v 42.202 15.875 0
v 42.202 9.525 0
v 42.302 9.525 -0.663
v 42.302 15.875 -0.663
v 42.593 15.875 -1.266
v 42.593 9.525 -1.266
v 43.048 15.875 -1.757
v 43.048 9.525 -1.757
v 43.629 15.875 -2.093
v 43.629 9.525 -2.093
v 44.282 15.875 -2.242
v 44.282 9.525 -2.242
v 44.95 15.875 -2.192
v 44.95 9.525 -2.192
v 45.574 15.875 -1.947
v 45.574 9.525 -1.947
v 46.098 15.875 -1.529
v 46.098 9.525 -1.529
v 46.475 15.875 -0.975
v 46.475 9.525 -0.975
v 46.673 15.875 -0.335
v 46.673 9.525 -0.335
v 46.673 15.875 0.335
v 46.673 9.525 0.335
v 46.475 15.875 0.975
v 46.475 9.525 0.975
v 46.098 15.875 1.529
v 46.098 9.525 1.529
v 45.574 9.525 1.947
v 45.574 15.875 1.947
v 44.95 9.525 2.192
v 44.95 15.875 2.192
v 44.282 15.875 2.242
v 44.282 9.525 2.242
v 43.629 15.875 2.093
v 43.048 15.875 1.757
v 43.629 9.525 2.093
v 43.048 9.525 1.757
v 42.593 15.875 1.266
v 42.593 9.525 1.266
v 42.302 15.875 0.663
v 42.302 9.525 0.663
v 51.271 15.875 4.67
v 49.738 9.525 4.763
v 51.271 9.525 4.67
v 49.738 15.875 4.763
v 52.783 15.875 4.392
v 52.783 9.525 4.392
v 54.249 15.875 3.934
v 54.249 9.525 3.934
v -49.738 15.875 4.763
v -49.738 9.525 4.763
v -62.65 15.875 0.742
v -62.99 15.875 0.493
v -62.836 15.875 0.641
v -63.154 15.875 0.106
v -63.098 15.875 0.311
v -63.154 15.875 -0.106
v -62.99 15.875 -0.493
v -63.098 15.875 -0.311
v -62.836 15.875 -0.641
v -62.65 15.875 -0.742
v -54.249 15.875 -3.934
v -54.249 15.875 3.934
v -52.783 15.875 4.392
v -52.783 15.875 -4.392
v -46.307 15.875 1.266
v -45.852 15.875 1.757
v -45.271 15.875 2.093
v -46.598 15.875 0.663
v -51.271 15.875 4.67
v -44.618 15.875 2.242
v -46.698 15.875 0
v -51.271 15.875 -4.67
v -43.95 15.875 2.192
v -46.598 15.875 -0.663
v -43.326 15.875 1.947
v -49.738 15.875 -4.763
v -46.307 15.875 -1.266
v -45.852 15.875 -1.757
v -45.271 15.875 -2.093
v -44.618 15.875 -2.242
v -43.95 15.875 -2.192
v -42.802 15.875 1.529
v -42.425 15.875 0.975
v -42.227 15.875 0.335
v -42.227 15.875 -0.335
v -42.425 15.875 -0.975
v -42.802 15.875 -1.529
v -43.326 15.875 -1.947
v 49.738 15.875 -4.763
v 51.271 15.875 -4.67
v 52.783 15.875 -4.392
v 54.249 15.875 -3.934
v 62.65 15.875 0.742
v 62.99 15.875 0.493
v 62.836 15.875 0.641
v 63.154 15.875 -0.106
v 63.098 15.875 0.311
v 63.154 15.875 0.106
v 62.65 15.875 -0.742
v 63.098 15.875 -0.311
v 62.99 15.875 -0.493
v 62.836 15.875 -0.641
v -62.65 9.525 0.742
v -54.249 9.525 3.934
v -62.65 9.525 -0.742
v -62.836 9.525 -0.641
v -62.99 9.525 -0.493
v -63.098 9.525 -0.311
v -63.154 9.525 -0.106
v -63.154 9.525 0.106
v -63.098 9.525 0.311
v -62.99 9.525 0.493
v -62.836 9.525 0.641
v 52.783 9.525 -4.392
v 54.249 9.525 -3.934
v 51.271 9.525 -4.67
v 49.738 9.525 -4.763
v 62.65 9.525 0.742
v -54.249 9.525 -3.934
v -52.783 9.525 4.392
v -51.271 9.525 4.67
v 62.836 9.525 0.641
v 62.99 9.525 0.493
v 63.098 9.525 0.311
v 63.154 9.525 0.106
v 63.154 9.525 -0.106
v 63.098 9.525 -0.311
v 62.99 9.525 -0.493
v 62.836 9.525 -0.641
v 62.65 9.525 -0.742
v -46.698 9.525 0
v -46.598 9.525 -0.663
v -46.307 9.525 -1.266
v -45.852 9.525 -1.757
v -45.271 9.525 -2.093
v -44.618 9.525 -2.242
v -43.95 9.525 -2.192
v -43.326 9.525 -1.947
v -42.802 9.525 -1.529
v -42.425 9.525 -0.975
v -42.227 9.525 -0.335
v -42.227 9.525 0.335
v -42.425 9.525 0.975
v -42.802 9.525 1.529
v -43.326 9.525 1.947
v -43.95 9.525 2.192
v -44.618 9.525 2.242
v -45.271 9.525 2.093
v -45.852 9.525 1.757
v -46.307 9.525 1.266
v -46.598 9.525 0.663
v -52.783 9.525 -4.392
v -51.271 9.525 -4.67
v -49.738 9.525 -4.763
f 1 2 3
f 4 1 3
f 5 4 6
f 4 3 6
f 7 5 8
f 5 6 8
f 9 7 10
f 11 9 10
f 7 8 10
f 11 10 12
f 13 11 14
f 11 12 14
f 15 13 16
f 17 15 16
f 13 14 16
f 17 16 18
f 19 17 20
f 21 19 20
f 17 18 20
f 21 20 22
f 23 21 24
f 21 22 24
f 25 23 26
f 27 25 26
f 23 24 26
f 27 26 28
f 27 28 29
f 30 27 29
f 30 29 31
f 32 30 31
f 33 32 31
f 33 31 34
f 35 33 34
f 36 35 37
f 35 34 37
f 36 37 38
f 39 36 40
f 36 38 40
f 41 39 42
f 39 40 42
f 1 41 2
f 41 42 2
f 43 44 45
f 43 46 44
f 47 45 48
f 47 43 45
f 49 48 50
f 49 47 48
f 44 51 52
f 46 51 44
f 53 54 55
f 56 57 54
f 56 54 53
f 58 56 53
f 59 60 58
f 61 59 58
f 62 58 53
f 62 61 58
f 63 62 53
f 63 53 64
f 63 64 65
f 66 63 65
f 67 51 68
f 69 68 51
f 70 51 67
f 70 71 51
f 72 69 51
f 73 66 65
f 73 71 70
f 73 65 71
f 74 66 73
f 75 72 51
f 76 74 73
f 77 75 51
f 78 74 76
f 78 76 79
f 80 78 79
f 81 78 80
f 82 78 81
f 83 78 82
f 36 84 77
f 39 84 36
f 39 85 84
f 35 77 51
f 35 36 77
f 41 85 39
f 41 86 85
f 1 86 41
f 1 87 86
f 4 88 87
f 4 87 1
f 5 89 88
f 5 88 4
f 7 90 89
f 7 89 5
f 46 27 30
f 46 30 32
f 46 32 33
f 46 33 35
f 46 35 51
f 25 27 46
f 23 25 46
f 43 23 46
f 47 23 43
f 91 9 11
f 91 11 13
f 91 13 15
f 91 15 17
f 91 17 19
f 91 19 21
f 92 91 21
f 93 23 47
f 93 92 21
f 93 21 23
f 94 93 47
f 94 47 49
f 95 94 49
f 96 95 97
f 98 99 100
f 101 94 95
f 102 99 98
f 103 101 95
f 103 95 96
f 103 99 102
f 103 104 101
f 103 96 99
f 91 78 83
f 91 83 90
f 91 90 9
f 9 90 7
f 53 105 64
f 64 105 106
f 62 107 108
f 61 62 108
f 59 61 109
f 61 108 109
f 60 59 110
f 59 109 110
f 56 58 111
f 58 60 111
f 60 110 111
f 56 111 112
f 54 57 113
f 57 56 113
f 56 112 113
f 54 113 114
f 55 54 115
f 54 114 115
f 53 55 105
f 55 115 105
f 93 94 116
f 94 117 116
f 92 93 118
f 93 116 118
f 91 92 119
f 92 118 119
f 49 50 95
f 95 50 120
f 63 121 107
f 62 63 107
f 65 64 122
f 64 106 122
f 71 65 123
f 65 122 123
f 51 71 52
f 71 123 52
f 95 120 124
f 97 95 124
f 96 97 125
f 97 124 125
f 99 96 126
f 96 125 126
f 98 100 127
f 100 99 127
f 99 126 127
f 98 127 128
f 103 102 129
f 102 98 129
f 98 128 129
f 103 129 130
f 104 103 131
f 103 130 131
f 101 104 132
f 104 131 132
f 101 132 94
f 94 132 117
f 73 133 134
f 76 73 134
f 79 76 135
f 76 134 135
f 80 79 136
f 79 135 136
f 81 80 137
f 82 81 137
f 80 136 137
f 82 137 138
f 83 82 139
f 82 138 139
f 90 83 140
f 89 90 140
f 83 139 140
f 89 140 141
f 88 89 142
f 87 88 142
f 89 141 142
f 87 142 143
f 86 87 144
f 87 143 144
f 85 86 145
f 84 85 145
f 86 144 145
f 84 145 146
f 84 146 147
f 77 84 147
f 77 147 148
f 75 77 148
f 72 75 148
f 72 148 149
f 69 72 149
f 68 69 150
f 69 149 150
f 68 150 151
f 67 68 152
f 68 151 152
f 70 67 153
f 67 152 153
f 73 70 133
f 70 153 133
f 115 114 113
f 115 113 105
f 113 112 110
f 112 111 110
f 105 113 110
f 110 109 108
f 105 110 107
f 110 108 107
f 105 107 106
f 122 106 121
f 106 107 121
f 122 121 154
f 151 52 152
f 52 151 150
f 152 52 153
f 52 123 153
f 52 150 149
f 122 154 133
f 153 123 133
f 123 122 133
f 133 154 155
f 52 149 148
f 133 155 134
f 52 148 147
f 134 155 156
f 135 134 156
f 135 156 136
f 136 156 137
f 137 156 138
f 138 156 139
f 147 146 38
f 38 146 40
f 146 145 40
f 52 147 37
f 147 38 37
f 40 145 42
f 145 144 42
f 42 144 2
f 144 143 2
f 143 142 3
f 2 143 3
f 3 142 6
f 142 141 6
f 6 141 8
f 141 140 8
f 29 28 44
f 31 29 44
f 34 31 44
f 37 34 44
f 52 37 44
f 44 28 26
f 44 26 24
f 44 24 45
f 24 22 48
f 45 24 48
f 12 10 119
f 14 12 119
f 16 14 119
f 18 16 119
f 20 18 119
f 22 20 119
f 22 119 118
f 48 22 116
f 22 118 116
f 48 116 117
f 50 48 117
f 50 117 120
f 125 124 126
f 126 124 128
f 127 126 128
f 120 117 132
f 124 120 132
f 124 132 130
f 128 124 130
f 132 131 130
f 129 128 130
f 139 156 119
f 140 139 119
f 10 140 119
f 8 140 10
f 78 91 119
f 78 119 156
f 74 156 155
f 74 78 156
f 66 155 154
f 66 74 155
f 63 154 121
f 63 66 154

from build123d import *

# Parameters (mm, degrees)
BOSS_EXTRUDE2_DEPTH                               = 22.225
BOSS_EXTRUDE2_DEPTH_BACK                          = 10
SKETCH2_W                                         = 153.14353988
SKETCH2_H                                         = 6.35
CUT_EXTRUDE1_DEPTH                                = 4.7625
SKETCH3_W                                         = 152.758434582
SKETCH3_H                                         = 6.35
CUT_EXTRUDE2_DEPTH                                = 4.7625
FILLET3_R                                         = 12.7
FILLET4_R                                         = 12.7
FILLET5_R                                         = 12.7
FILLET6_R                                         = 12.7
CUT_EXTRUDE3_DEPTH                                = 94.675
CUT_EXTRUDE3_DEPTH_BACK                           = 84.675
SKETCH12_R                                        = 168.402
CSK_FOR_8_FLAT_HEAD_SOCKET_CAP_SCREW2_D           = 4.4958
CSK_FOR_8_FLAT_HEAD_SOCKET_CAP_SCREW2_CSINK_D     = 9.1186
CSK_FOR_8_FLAT_HEAD_SOCKET_CAP_SCREW2_CSINK_ANGLE = 82
SKETCH25_W                                        = 151.836061676
SKETCH25_H                                        = 46.299624525
CUT_EXTRUDE4_DEPTH                                = 10.16
SKETCH26_W                                        = 138.514547674
SKETCH26_H                                        = 27.845278494
CUT_EXTRUDE5_DEPTH                                = 23.368


with BuildPart() as part:
    # Sketch1 → Boss-Extrude2 (new, two sides: drawn at the far end of the back side and taken through both)
    with BuildSketch(Plane(origin=(0, 0, 0), x_dir=(1, 0, 0), z_dir=(0, 1, 0)).offset(-BOSS_EXTRUDE2_DEPTH_BACK)):
        with BuildLine():
            Line((37.204956004, 9.525), (-37.204956004, 9.525))
            ThreePointArc((-37.204956004, 9.525), (-39.498289417, 9.316221792), (-41.716221563, 8.696751473))
            Line((-41.716221563, 8.696751473), (-62.649818949, 0.741984467))
            ThreePointArc((-62.649818949, 0.741984467), (-63.161614851, 0), (-62.649818949, -0.741984467))
            Line((-62.649818949, -0.741984467), (-41.716221563, -8.696751473))
            ThreePointArc((-41.716221563, -8.696751473), (-39.498289417, -9.316221792), (-37.204956004, -9.525))
            Line((-37.204956004, -9.525), (37.204956004, -9.525))
            ThreePointArc((37.204956004, -9.525), (39.498289417, -9.316221792), (41.716221563, -8.696751473))
            Line((41.716221563, -8.696751473), (62.649818949, -0.741984467))
            ThreePointArc((62.649818949, -0.741984467), (63.161614851, 0), (62.649818949, 0.741984467))
            Line((62.649818949, 0.741984467), (41.716221563, 8.696751473))
            ThreePointArc((41.716221563, 8.696751473), (39.498289417, 9.316221792), (37.204956004, 9.525))
        make_face()
    extrude(amount=BOSS_EXTRUDE2_DEPTH + BOSS_EXTRUDE2_DEPTH_BACK)

    # Sketch2 → Cut-Extrude1 (cut)
    with BuildSketch(Plane.XY.offset(9.525)):
        with Locations((7.894658594, 12.7)):
            Rectangle(SKETCH2_W, SKETCH2_H)
    extrude(amount=-CUT_EXTRUDE1_DEPTH, mode=Mode.SUBTRACT)

    # Sketch3 → Cut-Extrude2 (cut)
    with BuildSketch(Plane(origin=(0, 0, -9.525), x_dir=(-1, 0, 0), z_dir=(0, 0, -1))):
        with Locations((8.600684972, 12.7)):
            Rectangle(SKETCH3_W, SKETCH3_H)
    extrude(amount=-CUT_EXTRUDE2_DEPTH, mode=Mode.SUBTRACT)

    # Fillet3
    fillet3_edges = [part.edges().sort_by_distance(p)[0] for p in [
        (52.069514915, 12.7, -4.7625),
    ]]
    fillet(fillet3_edges, radius=FILLET3_R)

    # Fillet4
    fillet4_edges = [part.edges().sort_by_distance(p)[0] for p in [
        (52.069514915, 12.7, 4.7625),
    ]]
    fillet(fillet4_edges, radius=FILLET4_R)

    # Fillet5
    fillet5_edges = [part.edges().sort_by_distance(p)[0] for p in [
        (-52.069514915, 12.7, 4.7625),
    ]]
    fillet(fillet5_edges, radius=FILLET5_R)

    # Fillet6
    fillet6_edges = [part.edges().sort_by_distance(p)[0] for p in [
        (-52.069514915, 12.7, -4.7625),
    ]]
    fillet(fillet6_edges, radius=FILLET6_R)

    # Sketch12 → Cut-Extrude3 (cut, two sides: drawn at the far end of the back side and taken through both)
    with BuildSketch(Plane(origin=(0, 0, 0), x_dir=(0, 0, -1), z_dir=(1, 0, 0)).offset(-CUT_EXTRUDE3_DEPTH_BACK)):
        with Locations((0, -168.402)):
            Circle(SKETCH12_R)
    extrude(amount=CUT_EXTRUDE3_DEPTH + CUT_EXTRUDE3_DEPTH_BACK, mode=Mode.SUBTRACT)

    # CSK for #8 Flat Head Socket Cap Screw2 (through all)
    with Locations(Plane(origin=(0, 22.225, 0), x_dir=(1, 0, 0), z_dir=(0, 1, 0))):
        with Locations((-44.45, 0), (44.45, 0)):
            CounterSinkHole(CSK_FOR_8_FLAT_HEAD_SOCKET_CAP_SCREW2_D / 2, CSK_FOR_8_FLAT_HEAD_SOCKET_CAP_SCREW2_CSINK_D / 2, counter_sink_angle=CSK_FOR_8_FLAT_HEAD_SOCKET_CAP_SCREW2_CSINK_ANGLE)

    # Sketch25 → Cut-Extrude4 (cut)
    with BuildSketch(Plane(origin=(0, 15.875, 0), x_dir=(1, 0, 0), z_dir=(0, 1, 0))):
        with Locations((2.779627567, -6.342868994)):
            Rectangle(SKETCH25_W, SKETCH25_H)
    extrude(amount=CUT_EXTRUDE4_DEPTH, mode=Mode.SUBTRACT)

    # Sketch26 → Cut-Extrude5 (cut)
    with BuildSketch(Plane(origin=(0, 9.525, 0), x_dir=(1, 0, 0), z_dir=(0, 1, 0))):
        with Locations((0.08280518, -0.921909218)):
            Rectangle(SKETCH26_W, SKETCH26_H)
    extrude(amount=-CUT_EXTRUDE5_DEPTH, mode=Mode.SUBTRACT)


solid = part.part
